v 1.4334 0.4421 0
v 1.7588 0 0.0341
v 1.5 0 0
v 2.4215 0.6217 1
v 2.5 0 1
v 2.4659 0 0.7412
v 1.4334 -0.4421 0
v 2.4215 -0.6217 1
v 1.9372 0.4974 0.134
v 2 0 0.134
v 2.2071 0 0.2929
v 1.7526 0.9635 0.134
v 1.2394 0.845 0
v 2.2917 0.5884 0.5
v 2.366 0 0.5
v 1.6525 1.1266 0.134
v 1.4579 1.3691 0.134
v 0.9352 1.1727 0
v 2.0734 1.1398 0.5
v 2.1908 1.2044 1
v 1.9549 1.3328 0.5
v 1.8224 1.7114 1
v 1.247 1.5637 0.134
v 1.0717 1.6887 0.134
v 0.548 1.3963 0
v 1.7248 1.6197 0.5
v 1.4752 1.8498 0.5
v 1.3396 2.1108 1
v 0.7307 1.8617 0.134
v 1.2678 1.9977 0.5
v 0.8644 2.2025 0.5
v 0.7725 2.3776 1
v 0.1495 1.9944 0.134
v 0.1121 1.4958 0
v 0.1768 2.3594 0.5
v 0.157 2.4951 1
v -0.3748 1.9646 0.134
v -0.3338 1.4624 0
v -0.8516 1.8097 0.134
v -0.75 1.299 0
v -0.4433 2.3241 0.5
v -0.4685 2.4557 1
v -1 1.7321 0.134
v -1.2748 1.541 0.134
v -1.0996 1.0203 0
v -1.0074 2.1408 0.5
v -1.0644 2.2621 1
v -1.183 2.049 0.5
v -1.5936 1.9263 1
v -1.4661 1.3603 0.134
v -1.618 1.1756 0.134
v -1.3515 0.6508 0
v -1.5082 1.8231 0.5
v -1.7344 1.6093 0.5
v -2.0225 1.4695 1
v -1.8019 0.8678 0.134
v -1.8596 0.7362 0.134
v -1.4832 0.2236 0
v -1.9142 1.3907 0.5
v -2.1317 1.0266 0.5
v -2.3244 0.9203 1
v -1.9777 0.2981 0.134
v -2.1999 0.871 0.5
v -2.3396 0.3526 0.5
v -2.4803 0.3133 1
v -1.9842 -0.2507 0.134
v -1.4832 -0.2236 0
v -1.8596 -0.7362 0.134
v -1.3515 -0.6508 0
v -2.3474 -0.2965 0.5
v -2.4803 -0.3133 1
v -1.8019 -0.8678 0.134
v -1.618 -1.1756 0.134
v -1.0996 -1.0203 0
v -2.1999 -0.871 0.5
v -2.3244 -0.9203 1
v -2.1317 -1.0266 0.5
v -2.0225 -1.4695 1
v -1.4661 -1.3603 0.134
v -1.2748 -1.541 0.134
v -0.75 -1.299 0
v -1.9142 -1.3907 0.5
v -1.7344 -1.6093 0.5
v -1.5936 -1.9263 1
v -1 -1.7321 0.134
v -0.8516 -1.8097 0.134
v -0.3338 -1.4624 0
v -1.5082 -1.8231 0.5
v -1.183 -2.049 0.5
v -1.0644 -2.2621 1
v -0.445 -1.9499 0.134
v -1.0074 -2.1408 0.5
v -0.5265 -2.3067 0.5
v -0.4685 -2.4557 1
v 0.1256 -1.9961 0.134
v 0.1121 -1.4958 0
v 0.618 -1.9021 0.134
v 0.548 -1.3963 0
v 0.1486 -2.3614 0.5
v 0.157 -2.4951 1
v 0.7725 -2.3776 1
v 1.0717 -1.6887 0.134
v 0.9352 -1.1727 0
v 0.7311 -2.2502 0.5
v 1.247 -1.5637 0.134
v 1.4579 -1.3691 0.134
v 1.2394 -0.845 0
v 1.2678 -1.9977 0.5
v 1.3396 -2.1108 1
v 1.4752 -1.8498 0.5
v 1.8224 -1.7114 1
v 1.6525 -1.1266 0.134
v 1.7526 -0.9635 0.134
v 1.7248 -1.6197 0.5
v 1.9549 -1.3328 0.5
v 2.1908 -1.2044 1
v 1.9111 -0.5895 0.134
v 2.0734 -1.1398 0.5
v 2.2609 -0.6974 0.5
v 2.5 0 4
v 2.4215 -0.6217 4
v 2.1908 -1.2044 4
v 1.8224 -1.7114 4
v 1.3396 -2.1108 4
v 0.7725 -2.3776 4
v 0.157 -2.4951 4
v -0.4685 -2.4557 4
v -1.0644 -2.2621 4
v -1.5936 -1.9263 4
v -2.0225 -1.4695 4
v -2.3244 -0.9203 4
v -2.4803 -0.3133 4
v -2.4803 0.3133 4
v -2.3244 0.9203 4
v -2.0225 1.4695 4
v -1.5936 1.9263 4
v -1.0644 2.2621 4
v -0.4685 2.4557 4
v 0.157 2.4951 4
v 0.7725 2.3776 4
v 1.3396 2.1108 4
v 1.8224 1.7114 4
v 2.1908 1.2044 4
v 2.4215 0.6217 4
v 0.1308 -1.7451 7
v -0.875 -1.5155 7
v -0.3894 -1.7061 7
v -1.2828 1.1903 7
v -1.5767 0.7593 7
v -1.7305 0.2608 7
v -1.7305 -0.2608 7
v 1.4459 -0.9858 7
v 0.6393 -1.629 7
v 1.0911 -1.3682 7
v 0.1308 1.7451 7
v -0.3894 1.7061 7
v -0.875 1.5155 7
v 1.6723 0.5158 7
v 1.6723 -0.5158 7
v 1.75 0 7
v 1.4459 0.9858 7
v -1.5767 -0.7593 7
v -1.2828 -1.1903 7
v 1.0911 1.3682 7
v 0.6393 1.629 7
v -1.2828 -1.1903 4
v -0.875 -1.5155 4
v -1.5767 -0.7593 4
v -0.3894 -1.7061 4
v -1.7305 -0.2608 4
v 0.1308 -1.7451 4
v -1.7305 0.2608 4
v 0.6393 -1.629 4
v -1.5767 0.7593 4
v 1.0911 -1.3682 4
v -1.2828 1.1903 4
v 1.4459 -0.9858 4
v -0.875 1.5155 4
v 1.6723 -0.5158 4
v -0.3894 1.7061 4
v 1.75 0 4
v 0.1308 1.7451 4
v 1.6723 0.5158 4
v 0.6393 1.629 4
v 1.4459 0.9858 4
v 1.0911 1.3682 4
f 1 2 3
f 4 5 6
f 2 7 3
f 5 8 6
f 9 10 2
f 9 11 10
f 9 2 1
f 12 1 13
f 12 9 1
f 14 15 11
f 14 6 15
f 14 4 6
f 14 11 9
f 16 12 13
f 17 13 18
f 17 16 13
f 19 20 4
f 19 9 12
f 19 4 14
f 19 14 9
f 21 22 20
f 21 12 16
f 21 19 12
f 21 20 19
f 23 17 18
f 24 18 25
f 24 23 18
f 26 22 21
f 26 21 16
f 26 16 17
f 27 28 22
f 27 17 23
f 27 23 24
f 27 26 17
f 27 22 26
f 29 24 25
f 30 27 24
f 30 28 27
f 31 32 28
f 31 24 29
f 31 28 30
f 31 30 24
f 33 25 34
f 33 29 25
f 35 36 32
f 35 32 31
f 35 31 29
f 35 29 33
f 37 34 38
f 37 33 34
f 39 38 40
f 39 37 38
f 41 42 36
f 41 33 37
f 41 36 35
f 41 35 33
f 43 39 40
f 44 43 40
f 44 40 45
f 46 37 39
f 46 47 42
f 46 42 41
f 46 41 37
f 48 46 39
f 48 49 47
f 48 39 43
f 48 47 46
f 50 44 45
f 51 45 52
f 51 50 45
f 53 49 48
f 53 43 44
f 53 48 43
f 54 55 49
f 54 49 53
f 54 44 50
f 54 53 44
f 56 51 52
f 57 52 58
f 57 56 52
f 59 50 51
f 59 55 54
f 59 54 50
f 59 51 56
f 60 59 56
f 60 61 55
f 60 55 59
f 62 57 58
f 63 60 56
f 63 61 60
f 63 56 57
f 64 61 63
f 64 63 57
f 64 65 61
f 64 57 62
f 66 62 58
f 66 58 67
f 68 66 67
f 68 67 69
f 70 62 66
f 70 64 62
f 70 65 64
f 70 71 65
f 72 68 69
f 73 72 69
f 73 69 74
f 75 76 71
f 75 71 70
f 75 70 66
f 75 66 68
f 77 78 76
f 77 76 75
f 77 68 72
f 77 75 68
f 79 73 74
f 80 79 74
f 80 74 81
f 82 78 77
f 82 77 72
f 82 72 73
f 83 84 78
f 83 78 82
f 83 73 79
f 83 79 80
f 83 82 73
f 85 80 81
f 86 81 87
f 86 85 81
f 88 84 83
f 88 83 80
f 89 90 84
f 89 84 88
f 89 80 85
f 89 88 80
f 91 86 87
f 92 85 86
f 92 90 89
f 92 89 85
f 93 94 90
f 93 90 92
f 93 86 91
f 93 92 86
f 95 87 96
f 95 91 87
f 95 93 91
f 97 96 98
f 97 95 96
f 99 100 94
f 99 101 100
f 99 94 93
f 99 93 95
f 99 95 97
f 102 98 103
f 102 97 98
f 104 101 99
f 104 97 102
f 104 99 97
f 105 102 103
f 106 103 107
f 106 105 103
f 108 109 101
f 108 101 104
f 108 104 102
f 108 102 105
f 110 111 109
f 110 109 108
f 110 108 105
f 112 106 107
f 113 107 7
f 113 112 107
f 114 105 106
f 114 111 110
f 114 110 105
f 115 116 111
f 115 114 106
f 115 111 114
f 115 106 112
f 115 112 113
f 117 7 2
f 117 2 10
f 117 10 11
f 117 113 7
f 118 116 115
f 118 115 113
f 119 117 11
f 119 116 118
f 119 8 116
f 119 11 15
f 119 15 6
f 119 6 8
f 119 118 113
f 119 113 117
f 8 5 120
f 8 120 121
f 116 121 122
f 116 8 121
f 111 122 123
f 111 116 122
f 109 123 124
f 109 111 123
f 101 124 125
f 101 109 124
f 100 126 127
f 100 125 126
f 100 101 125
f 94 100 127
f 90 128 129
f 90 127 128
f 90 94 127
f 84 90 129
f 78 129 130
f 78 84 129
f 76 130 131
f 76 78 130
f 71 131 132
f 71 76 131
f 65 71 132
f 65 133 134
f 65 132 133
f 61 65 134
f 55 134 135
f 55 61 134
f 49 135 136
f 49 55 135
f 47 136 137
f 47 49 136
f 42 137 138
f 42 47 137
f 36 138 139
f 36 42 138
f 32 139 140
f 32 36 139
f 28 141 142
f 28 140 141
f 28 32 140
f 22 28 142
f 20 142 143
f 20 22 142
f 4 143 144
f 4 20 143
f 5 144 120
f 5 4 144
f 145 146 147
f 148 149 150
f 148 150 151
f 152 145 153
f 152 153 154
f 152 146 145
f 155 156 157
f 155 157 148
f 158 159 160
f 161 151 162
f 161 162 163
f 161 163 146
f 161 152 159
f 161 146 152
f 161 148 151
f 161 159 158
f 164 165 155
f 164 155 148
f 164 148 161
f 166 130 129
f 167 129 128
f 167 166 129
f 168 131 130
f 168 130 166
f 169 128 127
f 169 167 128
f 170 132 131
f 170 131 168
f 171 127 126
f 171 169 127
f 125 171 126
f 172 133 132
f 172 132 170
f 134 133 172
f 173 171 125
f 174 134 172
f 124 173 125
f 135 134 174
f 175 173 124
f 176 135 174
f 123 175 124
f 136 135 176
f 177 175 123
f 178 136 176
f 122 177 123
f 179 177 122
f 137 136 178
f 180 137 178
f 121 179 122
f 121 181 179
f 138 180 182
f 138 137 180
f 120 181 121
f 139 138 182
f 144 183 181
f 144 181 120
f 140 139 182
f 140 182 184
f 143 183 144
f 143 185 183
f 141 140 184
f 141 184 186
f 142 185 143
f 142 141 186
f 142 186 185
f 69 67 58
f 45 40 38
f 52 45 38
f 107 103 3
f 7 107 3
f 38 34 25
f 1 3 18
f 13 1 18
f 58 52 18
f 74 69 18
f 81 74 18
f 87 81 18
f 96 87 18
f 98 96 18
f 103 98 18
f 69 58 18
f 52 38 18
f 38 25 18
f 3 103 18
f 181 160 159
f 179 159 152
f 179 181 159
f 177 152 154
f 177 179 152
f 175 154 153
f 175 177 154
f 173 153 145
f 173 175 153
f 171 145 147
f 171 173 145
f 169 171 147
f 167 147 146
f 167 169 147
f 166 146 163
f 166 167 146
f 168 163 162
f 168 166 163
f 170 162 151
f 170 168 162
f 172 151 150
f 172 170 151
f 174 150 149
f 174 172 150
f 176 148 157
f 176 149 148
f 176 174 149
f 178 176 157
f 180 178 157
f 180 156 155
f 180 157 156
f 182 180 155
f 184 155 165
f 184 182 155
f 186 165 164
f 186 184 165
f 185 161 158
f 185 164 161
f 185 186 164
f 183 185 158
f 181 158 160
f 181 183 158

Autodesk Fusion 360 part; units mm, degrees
sketch "Sketch1" plane through (0, 0, 0) normal (0, 0, 1) x (1, 0, 0)
  circle A0 centre (0, 0) radius 2.5
  circle A1 centre (0, 0) radius 1.75
  dimension "d1" = 5
  dimension "d2" = 3.5
extrude "Extrude1" add sketch "Sketch1" along normal blind 4 contours A0 | A1
extrude "Extrude2" add sketch "Sketch1" along normal blind 7 contours A1
fillet "Fillet1" radius 1 1 edges at (-2.3308, -0.904, 0)
